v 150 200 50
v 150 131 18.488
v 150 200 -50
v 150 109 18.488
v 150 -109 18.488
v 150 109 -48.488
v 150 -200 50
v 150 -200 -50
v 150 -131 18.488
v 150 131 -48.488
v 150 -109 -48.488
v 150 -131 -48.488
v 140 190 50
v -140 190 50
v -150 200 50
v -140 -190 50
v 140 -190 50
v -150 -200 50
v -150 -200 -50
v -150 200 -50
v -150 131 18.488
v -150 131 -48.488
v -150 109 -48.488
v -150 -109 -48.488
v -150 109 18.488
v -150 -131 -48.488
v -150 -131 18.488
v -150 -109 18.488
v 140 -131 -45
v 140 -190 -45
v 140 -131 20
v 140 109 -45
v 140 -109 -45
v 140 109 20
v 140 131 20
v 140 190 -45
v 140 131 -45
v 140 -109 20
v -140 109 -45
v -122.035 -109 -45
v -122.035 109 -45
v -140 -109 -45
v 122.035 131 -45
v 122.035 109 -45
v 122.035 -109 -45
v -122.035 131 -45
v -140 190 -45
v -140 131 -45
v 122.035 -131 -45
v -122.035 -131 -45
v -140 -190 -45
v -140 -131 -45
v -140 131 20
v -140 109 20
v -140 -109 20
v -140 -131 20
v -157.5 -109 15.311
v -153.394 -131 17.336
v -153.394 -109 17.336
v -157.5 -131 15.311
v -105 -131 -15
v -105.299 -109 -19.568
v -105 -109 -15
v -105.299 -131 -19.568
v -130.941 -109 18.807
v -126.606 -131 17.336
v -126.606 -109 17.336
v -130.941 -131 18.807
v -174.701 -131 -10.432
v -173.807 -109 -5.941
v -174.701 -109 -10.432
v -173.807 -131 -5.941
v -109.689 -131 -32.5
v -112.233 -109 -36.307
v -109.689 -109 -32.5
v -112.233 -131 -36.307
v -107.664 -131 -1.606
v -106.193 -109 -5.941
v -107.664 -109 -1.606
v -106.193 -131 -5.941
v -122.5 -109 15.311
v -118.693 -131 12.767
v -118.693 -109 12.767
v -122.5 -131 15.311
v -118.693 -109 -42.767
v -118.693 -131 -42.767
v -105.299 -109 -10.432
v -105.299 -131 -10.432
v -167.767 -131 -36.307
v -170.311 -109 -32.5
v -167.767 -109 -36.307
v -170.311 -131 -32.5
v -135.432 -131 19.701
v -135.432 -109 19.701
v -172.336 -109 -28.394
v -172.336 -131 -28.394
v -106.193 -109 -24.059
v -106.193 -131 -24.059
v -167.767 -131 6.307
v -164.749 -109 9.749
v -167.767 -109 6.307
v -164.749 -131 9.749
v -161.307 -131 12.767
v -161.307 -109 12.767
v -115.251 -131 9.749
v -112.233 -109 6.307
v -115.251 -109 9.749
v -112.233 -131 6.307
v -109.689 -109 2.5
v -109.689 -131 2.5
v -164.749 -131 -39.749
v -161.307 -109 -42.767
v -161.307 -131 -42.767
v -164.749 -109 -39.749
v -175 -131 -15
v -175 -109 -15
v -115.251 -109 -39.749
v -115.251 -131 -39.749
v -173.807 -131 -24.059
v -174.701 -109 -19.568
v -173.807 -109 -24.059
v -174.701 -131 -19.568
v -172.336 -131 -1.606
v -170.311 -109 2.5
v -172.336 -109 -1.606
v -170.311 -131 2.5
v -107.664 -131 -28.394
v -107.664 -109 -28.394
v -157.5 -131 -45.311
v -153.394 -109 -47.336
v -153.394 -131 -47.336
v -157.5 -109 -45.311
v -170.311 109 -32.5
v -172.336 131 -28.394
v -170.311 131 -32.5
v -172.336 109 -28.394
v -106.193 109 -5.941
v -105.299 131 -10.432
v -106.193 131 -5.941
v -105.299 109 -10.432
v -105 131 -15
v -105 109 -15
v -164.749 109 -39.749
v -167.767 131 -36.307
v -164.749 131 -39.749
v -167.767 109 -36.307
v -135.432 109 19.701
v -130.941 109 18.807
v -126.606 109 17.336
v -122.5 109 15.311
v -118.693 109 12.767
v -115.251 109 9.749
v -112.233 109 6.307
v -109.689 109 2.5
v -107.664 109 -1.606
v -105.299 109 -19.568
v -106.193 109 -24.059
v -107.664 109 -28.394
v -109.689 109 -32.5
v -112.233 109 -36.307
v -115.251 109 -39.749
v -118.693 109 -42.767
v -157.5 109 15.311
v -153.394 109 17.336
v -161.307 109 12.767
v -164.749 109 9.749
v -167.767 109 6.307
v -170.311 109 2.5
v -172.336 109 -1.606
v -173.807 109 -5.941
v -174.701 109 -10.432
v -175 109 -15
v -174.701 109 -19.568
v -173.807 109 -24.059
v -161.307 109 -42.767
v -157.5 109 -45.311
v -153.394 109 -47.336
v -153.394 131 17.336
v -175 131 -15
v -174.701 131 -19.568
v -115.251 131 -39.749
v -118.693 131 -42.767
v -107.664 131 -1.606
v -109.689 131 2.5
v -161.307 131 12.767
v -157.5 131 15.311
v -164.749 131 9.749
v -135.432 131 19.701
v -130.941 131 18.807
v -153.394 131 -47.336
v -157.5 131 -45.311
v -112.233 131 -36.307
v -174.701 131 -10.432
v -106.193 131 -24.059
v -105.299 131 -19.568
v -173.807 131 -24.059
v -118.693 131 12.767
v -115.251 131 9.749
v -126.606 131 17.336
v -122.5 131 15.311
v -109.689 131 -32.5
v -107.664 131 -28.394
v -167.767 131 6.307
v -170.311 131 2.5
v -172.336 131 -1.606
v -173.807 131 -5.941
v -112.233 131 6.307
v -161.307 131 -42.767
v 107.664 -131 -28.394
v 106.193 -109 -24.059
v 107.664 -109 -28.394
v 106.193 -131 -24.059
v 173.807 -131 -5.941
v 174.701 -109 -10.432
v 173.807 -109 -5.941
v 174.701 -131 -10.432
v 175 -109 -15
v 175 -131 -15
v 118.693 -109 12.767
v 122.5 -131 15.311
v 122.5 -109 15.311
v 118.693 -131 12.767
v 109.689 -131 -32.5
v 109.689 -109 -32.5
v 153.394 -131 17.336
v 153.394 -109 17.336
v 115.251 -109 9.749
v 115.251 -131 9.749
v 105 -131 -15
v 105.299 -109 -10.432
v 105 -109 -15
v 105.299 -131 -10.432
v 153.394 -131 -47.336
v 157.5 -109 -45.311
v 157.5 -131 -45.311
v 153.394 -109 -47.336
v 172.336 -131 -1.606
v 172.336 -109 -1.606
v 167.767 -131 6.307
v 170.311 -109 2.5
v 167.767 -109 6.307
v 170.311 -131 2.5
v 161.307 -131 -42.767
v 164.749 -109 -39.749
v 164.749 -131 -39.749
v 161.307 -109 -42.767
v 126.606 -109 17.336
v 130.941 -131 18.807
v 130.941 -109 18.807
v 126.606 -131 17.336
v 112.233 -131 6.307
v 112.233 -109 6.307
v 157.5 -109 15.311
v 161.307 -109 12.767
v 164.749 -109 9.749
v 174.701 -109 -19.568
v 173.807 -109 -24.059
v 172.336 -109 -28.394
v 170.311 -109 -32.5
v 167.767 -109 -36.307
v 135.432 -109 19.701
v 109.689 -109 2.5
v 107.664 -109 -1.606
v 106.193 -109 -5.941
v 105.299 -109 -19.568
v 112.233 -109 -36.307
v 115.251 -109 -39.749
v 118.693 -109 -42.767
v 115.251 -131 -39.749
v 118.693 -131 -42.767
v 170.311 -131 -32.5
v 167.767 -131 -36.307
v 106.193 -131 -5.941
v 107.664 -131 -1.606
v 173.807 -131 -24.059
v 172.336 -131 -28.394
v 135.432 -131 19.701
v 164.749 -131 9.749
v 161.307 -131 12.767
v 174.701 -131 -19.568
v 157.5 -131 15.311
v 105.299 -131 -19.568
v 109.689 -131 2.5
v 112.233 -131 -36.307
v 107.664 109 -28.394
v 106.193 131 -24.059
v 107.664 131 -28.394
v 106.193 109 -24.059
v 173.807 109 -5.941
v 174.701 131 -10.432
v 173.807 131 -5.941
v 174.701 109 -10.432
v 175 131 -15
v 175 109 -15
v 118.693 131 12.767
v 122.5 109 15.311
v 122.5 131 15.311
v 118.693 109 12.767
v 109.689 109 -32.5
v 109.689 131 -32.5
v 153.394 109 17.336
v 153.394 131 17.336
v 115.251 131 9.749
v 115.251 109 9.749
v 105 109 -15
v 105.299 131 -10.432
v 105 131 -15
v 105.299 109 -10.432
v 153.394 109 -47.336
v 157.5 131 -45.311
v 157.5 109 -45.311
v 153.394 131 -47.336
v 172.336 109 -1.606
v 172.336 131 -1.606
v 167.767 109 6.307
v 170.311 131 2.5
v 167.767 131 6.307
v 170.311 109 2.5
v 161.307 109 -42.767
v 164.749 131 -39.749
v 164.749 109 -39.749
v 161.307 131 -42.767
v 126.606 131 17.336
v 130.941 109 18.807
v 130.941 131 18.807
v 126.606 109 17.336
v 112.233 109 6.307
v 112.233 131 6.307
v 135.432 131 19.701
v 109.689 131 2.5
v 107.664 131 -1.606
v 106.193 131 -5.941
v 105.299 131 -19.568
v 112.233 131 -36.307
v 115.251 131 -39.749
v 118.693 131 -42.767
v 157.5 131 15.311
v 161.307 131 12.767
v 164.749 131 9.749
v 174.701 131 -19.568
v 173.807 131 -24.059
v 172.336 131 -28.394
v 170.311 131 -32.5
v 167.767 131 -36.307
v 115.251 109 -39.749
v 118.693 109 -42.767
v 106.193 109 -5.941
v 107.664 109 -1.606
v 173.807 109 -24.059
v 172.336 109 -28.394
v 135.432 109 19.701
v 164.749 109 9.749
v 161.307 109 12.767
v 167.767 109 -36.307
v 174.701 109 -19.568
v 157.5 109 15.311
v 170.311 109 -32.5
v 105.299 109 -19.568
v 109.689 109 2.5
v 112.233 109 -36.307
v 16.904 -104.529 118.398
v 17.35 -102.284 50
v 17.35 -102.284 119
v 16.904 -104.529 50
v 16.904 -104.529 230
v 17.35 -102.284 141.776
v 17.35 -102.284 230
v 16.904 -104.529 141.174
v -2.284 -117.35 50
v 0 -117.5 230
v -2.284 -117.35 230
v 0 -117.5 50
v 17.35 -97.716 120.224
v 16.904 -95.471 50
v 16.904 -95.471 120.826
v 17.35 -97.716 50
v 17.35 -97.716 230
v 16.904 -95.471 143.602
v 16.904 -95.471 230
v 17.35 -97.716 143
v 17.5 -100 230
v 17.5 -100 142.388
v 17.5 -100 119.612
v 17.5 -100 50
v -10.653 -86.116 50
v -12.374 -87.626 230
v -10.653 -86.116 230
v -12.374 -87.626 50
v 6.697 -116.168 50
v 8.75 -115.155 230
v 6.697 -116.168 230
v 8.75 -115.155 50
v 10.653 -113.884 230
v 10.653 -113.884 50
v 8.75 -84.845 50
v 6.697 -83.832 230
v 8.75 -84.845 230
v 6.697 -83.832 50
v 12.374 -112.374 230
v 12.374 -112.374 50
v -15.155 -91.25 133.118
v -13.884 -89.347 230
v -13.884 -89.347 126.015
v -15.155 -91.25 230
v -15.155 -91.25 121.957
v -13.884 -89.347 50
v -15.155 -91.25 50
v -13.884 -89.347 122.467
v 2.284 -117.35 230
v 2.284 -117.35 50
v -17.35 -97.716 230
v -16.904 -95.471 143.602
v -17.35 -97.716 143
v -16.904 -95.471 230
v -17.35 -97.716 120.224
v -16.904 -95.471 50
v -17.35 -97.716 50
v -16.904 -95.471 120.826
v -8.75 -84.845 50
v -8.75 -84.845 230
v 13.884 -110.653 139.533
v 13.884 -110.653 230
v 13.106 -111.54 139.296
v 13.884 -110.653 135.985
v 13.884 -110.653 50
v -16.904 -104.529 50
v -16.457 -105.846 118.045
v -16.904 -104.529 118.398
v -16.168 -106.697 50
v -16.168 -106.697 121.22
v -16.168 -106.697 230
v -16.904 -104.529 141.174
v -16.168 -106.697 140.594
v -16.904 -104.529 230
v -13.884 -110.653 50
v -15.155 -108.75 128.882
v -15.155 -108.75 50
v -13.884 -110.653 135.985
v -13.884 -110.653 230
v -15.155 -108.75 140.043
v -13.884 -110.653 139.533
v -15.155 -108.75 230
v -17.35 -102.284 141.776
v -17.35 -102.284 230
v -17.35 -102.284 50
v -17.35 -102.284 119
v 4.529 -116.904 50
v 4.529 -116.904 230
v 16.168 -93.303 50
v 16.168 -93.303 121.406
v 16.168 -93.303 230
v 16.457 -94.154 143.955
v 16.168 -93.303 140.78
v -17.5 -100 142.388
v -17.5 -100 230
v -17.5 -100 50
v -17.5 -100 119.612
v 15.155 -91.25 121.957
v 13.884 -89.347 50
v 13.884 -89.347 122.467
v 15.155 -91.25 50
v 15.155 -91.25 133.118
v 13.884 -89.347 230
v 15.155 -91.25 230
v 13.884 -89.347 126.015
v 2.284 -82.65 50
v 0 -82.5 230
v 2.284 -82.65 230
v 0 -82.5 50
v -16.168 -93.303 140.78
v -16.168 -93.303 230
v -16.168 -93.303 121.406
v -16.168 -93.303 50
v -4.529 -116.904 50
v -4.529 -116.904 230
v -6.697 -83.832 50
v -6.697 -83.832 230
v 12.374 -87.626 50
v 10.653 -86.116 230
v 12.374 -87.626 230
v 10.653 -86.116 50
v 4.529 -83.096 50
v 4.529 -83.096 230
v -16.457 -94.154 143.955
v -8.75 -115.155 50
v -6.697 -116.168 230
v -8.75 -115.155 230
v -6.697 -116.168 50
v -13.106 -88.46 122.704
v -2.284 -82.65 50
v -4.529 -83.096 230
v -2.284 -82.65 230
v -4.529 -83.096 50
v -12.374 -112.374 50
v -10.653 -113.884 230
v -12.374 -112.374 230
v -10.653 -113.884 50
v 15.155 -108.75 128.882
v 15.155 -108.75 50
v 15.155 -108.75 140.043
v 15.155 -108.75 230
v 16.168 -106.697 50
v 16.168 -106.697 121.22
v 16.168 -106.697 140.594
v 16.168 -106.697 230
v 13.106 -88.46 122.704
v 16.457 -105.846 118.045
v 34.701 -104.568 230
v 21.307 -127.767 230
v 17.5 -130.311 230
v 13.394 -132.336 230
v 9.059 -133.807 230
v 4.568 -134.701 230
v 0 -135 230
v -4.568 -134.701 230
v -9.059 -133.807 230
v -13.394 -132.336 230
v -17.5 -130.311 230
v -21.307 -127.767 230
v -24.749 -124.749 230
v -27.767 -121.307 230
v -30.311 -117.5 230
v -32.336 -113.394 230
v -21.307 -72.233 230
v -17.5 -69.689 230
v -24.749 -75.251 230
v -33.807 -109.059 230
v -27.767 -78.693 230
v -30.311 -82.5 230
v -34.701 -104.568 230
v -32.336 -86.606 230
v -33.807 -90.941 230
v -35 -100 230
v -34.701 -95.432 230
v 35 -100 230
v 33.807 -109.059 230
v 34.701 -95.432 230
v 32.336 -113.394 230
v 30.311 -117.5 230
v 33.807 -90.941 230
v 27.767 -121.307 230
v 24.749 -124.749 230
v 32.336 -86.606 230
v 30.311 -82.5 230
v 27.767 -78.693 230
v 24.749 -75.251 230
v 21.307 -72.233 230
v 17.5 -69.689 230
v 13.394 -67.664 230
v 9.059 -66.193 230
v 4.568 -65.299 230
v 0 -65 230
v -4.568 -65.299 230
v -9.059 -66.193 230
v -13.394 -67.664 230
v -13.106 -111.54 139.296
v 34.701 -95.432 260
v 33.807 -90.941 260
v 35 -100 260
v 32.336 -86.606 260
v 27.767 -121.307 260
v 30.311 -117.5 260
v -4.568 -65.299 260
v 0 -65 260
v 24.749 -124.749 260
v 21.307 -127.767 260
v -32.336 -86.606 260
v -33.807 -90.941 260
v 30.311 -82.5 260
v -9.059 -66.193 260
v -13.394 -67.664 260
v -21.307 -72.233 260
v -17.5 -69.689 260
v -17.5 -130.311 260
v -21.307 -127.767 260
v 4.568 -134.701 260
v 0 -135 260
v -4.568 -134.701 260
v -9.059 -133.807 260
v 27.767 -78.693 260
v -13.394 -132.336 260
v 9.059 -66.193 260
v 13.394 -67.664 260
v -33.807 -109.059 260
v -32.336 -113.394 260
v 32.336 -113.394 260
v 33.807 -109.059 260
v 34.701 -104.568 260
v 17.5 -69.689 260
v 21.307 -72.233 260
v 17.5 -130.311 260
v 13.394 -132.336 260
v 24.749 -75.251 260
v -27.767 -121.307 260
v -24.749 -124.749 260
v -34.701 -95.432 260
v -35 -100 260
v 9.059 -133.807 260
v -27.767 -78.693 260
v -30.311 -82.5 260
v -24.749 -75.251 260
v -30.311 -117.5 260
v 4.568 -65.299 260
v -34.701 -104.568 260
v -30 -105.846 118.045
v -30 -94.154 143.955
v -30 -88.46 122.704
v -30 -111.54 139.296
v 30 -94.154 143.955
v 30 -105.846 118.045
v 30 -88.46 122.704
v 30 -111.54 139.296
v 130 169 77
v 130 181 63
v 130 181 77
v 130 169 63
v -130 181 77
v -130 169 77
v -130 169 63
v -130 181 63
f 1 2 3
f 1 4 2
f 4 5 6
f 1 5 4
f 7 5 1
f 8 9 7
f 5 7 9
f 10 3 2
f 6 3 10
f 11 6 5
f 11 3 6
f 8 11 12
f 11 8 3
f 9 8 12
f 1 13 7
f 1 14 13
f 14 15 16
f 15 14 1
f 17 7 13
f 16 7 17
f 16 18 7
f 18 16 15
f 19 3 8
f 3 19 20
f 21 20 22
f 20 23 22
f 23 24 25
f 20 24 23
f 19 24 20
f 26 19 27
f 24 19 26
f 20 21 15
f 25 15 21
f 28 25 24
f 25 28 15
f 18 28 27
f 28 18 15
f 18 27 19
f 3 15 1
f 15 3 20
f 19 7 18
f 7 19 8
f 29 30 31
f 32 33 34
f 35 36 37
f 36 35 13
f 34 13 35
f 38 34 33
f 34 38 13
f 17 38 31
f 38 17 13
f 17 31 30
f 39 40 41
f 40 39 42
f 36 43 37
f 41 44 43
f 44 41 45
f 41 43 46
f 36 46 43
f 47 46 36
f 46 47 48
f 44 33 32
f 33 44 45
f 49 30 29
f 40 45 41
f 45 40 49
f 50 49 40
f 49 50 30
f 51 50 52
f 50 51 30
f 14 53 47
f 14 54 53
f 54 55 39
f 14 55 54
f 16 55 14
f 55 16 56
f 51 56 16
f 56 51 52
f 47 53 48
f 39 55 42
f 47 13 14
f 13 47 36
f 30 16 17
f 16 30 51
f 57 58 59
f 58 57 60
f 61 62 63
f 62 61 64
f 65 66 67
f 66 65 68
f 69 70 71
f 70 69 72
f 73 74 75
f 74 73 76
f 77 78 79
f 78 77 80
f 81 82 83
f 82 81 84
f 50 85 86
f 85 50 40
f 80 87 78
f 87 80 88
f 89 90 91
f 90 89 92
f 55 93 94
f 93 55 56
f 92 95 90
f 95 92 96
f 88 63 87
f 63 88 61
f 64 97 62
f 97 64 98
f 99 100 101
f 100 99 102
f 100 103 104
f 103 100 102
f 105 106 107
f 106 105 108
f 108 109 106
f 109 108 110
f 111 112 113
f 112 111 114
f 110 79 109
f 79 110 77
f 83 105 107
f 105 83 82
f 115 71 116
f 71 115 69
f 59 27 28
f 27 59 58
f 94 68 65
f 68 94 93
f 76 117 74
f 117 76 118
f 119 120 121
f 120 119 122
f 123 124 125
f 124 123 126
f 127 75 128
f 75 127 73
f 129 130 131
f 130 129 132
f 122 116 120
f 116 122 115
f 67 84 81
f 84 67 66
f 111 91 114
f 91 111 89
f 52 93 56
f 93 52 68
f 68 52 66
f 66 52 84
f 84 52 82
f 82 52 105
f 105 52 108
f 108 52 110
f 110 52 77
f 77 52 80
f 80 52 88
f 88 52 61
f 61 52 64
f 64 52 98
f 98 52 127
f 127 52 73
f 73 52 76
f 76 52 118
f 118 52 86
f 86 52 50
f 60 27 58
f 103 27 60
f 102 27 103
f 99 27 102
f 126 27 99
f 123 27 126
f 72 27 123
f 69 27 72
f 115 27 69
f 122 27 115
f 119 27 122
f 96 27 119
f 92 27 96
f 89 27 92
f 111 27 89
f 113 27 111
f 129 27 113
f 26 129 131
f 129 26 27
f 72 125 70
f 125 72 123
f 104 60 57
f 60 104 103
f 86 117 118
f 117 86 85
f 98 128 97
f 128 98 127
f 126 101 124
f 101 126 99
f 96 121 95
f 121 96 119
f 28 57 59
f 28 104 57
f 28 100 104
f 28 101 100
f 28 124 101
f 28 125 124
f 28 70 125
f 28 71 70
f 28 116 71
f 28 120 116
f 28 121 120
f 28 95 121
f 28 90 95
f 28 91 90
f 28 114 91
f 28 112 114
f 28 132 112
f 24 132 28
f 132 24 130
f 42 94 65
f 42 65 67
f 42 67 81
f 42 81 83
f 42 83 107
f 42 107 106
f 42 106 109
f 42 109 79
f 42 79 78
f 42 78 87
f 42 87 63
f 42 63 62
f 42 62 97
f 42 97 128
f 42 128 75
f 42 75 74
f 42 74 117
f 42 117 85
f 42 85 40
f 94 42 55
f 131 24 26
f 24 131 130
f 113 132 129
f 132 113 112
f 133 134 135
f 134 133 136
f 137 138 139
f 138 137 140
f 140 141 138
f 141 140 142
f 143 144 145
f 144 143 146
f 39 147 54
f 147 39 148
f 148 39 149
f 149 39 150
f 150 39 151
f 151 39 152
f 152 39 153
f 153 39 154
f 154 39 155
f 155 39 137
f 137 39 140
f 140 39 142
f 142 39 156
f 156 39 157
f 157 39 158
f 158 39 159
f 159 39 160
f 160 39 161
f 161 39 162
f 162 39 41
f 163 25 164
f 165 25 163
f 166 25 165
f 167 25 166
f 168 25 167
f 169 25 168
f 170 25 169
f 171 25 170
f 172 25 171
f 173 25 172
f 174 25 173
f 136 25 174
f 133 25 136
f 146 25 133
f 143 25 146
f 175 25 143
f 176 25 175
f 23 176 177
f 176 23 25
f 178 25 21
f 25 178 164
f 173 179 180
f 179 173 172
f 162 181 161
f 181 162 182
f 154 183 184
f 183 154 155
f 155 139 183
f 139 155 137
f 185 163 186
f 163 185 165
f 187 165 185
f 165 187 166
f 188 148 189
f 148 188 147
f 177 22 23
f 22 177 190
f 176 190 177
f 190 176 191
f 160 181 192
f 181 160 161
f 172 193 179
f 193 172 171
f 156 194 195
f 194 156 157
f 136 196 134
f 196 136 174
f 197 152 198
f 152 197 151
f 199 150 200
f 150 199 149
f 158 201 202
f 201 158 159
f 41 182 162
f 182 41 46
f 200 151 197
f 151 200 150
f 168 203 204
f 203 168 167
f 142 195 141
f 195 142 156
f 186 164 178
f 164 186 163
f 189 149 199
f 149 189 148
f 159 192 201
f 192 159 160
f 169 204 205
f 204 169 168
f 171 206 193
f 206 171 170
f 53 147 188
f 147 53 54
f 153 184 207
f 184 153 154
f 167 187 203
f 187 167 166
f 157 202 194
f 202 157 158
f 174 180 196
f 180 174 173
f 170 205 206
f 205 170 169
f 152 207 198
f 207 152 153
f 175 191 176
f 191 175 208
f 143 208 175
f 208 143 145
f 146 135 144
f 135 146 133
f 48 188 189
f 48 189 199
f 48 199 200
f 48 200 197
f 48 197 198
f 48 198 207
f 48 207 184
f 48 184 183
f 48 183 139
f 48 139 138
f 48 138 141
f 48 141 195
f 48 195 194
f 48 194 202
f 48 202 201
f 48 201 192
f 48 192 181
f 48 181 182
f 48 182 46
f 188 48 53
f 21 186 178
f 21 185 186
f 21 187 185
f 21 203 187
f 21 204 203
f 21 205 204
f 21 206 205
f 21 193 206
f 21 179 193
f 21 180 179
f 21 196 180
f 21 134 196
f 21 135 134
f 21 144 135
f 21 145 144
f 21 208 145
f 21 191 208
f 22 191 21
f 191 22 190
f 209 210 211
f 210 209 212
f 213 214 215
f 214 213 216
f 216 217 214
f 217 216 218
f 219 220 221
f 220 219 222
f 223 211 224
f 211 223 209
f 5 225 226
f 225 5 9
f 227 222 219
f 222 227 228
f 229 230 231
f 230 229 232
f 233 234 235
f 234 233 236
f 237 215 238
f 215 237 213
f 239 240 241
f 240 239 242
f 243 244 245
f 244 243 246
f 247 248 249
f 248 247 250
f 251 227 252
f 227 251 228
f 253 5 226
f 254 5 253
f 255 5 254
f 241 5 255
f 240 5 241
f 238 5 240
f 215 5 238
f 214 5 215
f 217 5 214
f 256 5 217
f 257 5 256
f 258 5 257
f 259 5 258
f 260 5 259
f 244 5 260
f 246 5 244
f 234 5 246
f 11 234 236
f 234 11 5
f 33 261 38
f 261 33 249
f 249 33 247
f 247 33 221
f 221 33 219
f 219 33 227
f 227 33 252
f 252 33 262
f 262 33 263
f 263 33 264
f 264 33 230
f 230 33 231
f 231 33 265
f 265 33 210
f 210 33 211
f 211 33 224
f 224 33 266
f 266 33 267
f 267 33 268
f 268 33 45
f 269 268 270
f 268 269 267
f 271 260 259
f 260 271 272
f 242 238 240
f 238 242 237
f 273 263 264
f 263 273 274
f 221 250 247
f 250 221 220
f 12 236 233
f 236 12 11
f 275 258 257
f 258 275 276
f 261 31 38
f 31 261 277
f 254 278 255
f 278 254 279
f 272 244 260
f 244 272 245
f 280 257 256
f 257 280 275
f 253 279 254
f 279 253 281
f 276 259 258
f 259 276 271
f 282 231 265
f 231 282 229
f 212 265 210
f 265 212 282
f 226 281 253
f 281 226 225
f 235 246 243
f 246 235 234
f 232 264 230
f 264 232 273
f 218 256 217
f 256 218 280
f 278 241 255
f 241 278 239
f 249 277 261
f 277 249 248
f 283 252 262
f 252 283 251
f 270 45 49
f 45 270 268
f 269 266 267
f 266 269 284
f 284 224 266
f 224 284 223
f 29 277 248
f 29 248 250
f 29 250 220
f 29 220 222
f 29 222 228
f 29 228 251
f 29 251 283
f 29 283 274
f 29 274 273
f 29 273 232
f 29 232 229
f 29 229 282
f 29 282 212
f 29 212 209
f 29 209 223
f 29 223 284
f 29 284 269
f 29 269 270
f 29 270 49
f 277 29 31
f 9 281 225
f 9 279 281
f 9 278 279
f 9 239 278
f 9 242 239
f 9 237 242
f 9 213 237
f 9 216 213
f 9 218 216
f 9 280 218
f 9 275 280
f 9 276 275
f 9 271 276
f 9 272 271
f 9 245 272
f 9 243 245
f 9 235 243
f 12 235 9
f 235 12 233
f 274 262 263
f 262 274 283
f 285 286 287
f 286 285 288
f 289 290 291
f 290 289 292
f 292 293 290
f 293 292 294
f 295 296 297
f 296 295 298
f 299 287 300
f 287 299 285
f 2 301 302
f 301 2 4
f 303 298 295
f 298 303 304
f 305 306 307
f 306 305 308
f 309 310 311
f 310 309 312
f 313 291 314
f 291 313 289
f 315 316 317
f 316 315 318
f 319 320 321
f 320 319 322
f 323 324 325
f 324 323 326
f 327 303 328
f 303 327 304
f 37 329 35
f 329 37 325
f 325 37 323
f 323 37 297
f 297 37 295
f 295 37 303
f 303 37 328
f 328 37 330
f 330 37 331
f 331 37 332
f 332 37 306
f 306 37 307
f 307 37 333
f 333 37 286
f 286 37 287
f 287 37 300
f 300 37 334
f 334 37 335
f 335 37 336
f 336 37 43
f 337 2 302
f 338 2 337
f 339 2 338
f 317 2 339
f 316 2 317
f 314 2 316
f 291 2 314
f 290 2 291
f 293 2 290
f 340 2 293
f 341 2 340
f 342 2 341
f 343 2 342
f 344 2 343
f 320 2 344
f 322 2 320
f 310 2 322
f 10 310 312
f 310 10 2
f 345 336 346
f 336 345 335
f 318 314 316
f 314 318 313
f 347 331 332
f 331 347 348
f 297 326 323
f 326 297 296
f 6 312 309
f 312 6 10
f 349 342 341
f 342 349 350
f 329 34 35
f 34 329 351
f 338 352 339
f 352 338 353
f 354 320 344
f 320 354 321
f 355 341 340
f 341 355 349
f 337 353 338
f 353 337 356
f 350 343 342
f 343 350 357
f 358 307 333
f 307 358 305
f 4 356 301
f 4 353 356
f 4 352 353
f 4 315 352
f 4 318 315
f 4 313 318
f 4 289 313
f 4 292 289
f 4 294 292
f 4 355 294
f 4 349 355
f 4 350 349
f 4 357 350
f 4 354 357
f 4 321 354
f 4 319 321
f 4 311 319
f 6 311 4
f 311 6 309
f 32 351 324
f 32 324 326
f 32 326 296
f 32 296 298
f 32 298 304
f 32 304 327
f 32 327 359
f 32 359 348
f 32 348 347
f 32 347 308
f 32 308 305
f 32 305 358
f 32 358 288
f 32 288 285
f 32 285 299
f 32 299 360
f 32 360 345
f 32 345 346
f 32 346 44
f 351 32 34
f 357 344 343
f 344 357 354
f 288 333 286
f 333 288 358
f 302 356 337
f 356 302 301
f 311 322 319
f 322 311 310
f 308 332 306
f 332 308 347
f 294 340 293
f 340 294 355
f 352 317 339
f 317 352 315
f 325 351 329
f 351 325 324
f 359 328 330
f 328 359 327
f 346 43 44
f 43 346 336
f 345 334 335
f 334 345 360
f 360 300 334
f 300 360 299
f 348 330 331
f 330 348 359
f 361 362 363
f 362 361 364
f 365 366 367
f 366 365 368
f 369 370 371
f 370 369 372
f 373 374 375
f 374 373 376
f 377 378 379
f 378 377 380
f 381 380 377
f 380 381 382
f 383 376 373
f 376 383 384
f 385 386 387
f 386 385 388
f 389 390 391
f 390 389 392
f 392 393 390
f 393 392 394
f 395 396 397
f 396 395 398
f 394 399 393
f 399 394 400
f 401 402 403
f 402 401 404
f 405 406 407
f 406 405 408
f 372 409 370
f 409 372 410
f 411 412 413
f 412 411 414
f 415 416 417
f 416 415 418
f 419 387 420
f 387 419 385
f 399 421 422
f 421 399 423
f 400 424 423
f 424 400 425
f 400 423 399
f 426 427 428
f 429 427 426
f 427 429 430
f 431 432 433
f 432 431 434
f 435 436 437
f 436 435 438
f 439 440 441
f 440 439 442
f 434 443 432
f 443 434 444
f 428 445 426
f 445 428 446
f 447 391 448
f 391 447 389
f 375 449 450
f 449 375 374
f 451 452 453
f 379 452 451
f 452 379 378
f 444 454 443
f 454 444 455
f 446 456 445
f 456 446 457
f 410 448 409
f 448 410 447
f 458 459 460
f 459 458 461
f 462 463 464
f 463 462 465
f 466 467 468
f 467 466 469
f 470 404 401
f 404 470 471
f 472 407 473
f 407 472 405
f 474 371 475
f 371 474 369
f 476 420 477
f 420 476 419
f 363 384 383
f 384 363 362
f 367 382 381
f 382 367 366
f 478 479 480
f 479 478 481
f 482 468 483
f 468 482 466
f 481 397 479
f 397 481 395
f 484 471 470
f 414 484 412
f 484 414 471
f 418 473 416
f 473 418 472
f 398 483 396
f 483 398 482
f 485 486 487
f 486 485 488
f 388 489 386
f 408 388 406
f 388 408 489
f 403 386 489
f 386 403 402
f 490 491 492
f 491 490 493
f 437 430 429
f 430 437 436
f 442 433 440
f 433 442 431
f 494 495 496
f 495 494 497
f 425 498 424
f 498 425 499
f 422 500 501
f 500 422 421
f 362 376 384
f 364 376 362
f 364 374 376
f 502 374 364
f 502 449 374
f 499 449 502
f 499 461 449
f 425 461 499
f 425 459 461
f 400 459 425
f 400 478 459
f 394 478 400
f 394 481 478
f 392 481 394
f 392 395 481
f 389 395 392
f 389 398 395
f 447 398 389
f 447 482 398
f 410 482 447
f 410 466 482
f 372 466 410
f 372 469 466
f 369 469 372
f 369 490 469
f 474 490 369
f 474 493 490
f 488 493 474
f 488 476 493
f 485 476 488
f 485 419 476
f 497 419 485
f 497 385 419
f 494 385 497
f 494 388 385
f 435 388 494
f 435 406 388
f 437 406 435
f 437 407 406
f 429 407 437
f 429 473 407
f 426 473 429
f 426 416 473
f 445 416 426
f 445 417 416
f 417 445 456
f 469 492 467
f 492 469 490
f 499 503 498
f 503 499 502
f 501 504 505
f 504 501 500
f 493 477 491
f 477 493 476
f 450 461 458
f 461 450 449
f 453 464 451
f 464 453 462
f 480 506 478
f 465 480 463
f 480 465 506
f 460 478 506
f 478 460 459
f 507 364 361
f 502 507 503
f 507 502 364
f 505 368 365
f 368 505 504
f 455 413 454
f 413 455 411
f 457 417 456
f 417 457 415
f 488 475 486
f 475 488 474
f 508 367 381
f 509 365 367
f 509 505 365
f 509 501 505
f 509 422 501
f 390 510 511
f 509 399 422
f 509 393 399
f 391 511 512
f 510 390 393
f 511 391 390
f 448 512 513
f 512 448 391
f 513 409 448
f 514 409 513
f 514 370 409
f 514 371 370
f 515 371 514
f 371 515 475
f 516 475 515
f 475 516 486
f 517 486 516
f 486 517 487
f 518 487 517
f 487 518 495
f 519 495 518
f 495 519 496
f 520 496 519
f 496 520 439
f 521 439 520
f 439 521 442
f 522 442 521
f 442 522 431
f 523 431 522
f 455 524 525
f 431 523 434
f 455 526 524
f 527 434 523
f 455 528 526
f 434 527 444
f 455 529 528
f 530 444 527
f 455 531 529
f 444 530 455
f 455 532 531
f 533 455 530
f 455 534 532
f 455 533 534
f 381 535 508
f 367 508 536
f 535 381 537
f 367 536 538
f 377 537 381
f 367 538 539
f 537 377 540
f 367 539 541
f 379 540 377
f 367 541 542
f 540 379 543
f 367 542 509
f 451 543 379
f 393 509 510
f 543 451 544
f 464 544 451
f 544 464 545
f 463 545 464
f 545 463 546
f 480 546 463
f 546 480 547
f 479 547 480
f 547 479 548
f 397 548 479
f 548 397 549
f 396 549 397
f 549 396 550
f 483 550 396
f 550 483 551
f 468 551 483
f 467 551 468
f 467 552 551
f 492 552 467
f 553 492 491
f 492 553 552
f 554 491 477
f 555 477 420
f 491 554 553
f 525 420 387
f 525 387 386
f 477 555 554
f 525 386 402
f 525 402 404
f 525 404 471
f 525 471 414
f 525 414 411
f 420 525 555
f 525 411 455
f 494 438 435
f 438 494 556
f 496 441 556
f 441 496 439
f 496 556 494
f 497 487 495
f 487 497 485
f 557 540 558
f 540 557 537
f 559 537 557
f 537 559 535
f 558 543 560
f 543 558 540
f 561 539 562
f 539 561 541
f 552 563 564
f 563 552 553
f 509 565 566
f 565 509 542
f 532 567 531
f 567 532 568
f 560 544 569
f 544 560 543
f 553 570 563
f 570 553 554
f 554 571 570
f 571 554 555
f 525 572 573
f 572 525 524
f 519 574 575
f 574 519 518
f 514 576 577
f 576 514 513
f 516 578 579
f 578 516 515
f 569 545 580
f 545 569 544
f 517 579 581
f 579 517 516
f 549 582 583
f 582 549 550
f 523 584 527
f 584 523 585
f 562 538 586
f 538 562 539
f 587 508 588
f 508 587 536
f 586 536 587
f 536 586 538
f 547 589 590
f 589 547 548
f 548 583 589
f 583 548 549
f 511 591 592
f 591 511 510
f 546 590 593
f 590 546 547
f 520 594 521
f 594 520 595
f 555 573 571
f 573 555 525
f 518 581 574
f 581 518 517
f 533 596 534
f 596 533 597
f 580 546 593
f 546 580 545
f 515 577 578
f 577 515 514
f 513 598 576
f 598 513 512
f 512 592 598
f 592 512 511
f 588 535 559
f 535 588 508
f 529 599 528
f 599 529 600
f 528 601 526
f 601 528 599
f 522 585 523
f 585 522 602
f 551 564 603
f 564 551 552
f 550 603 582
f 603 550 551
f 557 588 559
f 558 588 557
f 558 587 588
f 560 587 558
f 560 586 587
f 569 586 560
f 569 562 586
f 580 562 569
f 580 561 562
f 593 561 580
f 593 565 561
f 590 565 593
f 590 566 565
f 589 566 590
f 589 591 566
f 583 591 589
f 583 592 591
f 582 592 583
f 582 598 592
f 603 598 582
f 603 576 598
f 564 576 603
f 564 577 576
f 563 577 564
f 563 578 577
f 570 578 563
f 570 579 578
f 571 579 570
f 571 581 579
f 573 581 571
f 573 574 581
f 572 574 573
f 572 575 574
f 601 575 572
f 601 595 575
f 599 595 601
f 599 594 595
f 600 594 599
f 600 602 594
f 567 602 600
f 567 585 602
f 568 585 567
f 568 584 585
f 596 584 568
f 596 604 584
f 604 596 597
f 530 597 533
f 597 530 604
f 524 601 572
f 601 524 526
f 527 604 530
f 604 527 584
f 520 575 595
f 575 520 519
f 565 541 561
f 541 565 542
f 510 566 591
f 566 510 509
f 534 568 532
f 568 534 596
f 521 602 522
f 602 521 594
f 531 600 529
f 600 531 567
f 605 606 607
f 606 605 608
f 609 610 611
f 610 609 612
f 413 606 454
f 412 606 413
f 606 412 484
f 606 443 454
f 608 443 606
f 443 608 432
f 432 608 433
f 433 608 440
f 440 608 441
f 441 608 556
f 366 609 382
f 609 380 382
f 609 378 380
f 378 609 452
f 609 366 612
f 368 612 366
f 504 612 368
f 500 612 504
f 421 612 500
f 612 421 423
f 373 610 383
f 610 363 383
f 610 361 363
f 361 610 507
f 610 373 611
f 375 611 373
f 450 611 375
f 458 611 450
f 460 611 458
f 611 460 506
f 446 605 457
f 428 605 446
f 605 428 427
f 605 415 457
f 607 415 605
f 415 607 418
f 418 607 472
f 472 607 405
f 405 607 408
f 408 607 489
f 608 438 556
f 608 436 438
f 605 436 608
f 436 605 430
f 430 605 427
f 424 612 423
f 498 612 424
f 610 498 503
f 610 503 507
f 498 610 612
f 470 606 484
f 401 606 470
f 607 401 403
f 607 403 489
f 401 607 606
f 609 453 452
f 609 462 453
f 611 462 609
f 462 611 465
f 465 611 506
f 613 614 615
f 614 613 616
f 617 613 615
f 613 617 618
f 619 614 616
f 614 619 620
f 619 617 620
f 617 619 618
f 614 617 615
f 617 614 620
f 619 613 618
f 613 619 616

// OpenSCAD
// SmartAI robot chassis — Variant B: Tall Navigator
// Taller mast for camera + future LiDAR. Indoor navigation focus.

$fn = 48;

body_w = 300;
body_l = 400;
body_h = 100;
wheel_d = 70;
wheel_w = 22;
wheelbase = 280;
track = 240;
mast_h = 180;

module wheel() {
    rotate([90, 0, 0])
        cylinder(h = wheel_w, d = wheel_d, center = true);
}

// Rectangular aluminum-style base
difference() {
    cube([body_w, body_l, body_h], center = true);
    translate([0, 0, 5])
        cube([body_w - 20, body_l - 20, body_h], center = true);
}

for (x = [-wheelbase/2, wheelbase/2]) {
    for (y = [-track/2, track/2]) {
        translate([x, y, -body_h/2 + wheel_d/2])
            wheel();
    }
}

// Central mast
translate([0, -body_l/4, body_h/2])
    cylinder(h = mast_h, d = 35);

// LiDAR puck (placeholder)
translate([0, -body_l/4, body_h/2 + mast_h])
    cylinder(h = 30, d = 70);

// Camera module
translate([0, -body_l/4, body_h/2 + mast_h * 0.45])
    rotate([15, 0, 0])
        cube([60, 18, 22], center = true);

// Ultrasonic array bar
translate([0, body_l/2 - 25, body_h/2 + 20])
    cube([body_w - 40, 12, 14], center = true);
